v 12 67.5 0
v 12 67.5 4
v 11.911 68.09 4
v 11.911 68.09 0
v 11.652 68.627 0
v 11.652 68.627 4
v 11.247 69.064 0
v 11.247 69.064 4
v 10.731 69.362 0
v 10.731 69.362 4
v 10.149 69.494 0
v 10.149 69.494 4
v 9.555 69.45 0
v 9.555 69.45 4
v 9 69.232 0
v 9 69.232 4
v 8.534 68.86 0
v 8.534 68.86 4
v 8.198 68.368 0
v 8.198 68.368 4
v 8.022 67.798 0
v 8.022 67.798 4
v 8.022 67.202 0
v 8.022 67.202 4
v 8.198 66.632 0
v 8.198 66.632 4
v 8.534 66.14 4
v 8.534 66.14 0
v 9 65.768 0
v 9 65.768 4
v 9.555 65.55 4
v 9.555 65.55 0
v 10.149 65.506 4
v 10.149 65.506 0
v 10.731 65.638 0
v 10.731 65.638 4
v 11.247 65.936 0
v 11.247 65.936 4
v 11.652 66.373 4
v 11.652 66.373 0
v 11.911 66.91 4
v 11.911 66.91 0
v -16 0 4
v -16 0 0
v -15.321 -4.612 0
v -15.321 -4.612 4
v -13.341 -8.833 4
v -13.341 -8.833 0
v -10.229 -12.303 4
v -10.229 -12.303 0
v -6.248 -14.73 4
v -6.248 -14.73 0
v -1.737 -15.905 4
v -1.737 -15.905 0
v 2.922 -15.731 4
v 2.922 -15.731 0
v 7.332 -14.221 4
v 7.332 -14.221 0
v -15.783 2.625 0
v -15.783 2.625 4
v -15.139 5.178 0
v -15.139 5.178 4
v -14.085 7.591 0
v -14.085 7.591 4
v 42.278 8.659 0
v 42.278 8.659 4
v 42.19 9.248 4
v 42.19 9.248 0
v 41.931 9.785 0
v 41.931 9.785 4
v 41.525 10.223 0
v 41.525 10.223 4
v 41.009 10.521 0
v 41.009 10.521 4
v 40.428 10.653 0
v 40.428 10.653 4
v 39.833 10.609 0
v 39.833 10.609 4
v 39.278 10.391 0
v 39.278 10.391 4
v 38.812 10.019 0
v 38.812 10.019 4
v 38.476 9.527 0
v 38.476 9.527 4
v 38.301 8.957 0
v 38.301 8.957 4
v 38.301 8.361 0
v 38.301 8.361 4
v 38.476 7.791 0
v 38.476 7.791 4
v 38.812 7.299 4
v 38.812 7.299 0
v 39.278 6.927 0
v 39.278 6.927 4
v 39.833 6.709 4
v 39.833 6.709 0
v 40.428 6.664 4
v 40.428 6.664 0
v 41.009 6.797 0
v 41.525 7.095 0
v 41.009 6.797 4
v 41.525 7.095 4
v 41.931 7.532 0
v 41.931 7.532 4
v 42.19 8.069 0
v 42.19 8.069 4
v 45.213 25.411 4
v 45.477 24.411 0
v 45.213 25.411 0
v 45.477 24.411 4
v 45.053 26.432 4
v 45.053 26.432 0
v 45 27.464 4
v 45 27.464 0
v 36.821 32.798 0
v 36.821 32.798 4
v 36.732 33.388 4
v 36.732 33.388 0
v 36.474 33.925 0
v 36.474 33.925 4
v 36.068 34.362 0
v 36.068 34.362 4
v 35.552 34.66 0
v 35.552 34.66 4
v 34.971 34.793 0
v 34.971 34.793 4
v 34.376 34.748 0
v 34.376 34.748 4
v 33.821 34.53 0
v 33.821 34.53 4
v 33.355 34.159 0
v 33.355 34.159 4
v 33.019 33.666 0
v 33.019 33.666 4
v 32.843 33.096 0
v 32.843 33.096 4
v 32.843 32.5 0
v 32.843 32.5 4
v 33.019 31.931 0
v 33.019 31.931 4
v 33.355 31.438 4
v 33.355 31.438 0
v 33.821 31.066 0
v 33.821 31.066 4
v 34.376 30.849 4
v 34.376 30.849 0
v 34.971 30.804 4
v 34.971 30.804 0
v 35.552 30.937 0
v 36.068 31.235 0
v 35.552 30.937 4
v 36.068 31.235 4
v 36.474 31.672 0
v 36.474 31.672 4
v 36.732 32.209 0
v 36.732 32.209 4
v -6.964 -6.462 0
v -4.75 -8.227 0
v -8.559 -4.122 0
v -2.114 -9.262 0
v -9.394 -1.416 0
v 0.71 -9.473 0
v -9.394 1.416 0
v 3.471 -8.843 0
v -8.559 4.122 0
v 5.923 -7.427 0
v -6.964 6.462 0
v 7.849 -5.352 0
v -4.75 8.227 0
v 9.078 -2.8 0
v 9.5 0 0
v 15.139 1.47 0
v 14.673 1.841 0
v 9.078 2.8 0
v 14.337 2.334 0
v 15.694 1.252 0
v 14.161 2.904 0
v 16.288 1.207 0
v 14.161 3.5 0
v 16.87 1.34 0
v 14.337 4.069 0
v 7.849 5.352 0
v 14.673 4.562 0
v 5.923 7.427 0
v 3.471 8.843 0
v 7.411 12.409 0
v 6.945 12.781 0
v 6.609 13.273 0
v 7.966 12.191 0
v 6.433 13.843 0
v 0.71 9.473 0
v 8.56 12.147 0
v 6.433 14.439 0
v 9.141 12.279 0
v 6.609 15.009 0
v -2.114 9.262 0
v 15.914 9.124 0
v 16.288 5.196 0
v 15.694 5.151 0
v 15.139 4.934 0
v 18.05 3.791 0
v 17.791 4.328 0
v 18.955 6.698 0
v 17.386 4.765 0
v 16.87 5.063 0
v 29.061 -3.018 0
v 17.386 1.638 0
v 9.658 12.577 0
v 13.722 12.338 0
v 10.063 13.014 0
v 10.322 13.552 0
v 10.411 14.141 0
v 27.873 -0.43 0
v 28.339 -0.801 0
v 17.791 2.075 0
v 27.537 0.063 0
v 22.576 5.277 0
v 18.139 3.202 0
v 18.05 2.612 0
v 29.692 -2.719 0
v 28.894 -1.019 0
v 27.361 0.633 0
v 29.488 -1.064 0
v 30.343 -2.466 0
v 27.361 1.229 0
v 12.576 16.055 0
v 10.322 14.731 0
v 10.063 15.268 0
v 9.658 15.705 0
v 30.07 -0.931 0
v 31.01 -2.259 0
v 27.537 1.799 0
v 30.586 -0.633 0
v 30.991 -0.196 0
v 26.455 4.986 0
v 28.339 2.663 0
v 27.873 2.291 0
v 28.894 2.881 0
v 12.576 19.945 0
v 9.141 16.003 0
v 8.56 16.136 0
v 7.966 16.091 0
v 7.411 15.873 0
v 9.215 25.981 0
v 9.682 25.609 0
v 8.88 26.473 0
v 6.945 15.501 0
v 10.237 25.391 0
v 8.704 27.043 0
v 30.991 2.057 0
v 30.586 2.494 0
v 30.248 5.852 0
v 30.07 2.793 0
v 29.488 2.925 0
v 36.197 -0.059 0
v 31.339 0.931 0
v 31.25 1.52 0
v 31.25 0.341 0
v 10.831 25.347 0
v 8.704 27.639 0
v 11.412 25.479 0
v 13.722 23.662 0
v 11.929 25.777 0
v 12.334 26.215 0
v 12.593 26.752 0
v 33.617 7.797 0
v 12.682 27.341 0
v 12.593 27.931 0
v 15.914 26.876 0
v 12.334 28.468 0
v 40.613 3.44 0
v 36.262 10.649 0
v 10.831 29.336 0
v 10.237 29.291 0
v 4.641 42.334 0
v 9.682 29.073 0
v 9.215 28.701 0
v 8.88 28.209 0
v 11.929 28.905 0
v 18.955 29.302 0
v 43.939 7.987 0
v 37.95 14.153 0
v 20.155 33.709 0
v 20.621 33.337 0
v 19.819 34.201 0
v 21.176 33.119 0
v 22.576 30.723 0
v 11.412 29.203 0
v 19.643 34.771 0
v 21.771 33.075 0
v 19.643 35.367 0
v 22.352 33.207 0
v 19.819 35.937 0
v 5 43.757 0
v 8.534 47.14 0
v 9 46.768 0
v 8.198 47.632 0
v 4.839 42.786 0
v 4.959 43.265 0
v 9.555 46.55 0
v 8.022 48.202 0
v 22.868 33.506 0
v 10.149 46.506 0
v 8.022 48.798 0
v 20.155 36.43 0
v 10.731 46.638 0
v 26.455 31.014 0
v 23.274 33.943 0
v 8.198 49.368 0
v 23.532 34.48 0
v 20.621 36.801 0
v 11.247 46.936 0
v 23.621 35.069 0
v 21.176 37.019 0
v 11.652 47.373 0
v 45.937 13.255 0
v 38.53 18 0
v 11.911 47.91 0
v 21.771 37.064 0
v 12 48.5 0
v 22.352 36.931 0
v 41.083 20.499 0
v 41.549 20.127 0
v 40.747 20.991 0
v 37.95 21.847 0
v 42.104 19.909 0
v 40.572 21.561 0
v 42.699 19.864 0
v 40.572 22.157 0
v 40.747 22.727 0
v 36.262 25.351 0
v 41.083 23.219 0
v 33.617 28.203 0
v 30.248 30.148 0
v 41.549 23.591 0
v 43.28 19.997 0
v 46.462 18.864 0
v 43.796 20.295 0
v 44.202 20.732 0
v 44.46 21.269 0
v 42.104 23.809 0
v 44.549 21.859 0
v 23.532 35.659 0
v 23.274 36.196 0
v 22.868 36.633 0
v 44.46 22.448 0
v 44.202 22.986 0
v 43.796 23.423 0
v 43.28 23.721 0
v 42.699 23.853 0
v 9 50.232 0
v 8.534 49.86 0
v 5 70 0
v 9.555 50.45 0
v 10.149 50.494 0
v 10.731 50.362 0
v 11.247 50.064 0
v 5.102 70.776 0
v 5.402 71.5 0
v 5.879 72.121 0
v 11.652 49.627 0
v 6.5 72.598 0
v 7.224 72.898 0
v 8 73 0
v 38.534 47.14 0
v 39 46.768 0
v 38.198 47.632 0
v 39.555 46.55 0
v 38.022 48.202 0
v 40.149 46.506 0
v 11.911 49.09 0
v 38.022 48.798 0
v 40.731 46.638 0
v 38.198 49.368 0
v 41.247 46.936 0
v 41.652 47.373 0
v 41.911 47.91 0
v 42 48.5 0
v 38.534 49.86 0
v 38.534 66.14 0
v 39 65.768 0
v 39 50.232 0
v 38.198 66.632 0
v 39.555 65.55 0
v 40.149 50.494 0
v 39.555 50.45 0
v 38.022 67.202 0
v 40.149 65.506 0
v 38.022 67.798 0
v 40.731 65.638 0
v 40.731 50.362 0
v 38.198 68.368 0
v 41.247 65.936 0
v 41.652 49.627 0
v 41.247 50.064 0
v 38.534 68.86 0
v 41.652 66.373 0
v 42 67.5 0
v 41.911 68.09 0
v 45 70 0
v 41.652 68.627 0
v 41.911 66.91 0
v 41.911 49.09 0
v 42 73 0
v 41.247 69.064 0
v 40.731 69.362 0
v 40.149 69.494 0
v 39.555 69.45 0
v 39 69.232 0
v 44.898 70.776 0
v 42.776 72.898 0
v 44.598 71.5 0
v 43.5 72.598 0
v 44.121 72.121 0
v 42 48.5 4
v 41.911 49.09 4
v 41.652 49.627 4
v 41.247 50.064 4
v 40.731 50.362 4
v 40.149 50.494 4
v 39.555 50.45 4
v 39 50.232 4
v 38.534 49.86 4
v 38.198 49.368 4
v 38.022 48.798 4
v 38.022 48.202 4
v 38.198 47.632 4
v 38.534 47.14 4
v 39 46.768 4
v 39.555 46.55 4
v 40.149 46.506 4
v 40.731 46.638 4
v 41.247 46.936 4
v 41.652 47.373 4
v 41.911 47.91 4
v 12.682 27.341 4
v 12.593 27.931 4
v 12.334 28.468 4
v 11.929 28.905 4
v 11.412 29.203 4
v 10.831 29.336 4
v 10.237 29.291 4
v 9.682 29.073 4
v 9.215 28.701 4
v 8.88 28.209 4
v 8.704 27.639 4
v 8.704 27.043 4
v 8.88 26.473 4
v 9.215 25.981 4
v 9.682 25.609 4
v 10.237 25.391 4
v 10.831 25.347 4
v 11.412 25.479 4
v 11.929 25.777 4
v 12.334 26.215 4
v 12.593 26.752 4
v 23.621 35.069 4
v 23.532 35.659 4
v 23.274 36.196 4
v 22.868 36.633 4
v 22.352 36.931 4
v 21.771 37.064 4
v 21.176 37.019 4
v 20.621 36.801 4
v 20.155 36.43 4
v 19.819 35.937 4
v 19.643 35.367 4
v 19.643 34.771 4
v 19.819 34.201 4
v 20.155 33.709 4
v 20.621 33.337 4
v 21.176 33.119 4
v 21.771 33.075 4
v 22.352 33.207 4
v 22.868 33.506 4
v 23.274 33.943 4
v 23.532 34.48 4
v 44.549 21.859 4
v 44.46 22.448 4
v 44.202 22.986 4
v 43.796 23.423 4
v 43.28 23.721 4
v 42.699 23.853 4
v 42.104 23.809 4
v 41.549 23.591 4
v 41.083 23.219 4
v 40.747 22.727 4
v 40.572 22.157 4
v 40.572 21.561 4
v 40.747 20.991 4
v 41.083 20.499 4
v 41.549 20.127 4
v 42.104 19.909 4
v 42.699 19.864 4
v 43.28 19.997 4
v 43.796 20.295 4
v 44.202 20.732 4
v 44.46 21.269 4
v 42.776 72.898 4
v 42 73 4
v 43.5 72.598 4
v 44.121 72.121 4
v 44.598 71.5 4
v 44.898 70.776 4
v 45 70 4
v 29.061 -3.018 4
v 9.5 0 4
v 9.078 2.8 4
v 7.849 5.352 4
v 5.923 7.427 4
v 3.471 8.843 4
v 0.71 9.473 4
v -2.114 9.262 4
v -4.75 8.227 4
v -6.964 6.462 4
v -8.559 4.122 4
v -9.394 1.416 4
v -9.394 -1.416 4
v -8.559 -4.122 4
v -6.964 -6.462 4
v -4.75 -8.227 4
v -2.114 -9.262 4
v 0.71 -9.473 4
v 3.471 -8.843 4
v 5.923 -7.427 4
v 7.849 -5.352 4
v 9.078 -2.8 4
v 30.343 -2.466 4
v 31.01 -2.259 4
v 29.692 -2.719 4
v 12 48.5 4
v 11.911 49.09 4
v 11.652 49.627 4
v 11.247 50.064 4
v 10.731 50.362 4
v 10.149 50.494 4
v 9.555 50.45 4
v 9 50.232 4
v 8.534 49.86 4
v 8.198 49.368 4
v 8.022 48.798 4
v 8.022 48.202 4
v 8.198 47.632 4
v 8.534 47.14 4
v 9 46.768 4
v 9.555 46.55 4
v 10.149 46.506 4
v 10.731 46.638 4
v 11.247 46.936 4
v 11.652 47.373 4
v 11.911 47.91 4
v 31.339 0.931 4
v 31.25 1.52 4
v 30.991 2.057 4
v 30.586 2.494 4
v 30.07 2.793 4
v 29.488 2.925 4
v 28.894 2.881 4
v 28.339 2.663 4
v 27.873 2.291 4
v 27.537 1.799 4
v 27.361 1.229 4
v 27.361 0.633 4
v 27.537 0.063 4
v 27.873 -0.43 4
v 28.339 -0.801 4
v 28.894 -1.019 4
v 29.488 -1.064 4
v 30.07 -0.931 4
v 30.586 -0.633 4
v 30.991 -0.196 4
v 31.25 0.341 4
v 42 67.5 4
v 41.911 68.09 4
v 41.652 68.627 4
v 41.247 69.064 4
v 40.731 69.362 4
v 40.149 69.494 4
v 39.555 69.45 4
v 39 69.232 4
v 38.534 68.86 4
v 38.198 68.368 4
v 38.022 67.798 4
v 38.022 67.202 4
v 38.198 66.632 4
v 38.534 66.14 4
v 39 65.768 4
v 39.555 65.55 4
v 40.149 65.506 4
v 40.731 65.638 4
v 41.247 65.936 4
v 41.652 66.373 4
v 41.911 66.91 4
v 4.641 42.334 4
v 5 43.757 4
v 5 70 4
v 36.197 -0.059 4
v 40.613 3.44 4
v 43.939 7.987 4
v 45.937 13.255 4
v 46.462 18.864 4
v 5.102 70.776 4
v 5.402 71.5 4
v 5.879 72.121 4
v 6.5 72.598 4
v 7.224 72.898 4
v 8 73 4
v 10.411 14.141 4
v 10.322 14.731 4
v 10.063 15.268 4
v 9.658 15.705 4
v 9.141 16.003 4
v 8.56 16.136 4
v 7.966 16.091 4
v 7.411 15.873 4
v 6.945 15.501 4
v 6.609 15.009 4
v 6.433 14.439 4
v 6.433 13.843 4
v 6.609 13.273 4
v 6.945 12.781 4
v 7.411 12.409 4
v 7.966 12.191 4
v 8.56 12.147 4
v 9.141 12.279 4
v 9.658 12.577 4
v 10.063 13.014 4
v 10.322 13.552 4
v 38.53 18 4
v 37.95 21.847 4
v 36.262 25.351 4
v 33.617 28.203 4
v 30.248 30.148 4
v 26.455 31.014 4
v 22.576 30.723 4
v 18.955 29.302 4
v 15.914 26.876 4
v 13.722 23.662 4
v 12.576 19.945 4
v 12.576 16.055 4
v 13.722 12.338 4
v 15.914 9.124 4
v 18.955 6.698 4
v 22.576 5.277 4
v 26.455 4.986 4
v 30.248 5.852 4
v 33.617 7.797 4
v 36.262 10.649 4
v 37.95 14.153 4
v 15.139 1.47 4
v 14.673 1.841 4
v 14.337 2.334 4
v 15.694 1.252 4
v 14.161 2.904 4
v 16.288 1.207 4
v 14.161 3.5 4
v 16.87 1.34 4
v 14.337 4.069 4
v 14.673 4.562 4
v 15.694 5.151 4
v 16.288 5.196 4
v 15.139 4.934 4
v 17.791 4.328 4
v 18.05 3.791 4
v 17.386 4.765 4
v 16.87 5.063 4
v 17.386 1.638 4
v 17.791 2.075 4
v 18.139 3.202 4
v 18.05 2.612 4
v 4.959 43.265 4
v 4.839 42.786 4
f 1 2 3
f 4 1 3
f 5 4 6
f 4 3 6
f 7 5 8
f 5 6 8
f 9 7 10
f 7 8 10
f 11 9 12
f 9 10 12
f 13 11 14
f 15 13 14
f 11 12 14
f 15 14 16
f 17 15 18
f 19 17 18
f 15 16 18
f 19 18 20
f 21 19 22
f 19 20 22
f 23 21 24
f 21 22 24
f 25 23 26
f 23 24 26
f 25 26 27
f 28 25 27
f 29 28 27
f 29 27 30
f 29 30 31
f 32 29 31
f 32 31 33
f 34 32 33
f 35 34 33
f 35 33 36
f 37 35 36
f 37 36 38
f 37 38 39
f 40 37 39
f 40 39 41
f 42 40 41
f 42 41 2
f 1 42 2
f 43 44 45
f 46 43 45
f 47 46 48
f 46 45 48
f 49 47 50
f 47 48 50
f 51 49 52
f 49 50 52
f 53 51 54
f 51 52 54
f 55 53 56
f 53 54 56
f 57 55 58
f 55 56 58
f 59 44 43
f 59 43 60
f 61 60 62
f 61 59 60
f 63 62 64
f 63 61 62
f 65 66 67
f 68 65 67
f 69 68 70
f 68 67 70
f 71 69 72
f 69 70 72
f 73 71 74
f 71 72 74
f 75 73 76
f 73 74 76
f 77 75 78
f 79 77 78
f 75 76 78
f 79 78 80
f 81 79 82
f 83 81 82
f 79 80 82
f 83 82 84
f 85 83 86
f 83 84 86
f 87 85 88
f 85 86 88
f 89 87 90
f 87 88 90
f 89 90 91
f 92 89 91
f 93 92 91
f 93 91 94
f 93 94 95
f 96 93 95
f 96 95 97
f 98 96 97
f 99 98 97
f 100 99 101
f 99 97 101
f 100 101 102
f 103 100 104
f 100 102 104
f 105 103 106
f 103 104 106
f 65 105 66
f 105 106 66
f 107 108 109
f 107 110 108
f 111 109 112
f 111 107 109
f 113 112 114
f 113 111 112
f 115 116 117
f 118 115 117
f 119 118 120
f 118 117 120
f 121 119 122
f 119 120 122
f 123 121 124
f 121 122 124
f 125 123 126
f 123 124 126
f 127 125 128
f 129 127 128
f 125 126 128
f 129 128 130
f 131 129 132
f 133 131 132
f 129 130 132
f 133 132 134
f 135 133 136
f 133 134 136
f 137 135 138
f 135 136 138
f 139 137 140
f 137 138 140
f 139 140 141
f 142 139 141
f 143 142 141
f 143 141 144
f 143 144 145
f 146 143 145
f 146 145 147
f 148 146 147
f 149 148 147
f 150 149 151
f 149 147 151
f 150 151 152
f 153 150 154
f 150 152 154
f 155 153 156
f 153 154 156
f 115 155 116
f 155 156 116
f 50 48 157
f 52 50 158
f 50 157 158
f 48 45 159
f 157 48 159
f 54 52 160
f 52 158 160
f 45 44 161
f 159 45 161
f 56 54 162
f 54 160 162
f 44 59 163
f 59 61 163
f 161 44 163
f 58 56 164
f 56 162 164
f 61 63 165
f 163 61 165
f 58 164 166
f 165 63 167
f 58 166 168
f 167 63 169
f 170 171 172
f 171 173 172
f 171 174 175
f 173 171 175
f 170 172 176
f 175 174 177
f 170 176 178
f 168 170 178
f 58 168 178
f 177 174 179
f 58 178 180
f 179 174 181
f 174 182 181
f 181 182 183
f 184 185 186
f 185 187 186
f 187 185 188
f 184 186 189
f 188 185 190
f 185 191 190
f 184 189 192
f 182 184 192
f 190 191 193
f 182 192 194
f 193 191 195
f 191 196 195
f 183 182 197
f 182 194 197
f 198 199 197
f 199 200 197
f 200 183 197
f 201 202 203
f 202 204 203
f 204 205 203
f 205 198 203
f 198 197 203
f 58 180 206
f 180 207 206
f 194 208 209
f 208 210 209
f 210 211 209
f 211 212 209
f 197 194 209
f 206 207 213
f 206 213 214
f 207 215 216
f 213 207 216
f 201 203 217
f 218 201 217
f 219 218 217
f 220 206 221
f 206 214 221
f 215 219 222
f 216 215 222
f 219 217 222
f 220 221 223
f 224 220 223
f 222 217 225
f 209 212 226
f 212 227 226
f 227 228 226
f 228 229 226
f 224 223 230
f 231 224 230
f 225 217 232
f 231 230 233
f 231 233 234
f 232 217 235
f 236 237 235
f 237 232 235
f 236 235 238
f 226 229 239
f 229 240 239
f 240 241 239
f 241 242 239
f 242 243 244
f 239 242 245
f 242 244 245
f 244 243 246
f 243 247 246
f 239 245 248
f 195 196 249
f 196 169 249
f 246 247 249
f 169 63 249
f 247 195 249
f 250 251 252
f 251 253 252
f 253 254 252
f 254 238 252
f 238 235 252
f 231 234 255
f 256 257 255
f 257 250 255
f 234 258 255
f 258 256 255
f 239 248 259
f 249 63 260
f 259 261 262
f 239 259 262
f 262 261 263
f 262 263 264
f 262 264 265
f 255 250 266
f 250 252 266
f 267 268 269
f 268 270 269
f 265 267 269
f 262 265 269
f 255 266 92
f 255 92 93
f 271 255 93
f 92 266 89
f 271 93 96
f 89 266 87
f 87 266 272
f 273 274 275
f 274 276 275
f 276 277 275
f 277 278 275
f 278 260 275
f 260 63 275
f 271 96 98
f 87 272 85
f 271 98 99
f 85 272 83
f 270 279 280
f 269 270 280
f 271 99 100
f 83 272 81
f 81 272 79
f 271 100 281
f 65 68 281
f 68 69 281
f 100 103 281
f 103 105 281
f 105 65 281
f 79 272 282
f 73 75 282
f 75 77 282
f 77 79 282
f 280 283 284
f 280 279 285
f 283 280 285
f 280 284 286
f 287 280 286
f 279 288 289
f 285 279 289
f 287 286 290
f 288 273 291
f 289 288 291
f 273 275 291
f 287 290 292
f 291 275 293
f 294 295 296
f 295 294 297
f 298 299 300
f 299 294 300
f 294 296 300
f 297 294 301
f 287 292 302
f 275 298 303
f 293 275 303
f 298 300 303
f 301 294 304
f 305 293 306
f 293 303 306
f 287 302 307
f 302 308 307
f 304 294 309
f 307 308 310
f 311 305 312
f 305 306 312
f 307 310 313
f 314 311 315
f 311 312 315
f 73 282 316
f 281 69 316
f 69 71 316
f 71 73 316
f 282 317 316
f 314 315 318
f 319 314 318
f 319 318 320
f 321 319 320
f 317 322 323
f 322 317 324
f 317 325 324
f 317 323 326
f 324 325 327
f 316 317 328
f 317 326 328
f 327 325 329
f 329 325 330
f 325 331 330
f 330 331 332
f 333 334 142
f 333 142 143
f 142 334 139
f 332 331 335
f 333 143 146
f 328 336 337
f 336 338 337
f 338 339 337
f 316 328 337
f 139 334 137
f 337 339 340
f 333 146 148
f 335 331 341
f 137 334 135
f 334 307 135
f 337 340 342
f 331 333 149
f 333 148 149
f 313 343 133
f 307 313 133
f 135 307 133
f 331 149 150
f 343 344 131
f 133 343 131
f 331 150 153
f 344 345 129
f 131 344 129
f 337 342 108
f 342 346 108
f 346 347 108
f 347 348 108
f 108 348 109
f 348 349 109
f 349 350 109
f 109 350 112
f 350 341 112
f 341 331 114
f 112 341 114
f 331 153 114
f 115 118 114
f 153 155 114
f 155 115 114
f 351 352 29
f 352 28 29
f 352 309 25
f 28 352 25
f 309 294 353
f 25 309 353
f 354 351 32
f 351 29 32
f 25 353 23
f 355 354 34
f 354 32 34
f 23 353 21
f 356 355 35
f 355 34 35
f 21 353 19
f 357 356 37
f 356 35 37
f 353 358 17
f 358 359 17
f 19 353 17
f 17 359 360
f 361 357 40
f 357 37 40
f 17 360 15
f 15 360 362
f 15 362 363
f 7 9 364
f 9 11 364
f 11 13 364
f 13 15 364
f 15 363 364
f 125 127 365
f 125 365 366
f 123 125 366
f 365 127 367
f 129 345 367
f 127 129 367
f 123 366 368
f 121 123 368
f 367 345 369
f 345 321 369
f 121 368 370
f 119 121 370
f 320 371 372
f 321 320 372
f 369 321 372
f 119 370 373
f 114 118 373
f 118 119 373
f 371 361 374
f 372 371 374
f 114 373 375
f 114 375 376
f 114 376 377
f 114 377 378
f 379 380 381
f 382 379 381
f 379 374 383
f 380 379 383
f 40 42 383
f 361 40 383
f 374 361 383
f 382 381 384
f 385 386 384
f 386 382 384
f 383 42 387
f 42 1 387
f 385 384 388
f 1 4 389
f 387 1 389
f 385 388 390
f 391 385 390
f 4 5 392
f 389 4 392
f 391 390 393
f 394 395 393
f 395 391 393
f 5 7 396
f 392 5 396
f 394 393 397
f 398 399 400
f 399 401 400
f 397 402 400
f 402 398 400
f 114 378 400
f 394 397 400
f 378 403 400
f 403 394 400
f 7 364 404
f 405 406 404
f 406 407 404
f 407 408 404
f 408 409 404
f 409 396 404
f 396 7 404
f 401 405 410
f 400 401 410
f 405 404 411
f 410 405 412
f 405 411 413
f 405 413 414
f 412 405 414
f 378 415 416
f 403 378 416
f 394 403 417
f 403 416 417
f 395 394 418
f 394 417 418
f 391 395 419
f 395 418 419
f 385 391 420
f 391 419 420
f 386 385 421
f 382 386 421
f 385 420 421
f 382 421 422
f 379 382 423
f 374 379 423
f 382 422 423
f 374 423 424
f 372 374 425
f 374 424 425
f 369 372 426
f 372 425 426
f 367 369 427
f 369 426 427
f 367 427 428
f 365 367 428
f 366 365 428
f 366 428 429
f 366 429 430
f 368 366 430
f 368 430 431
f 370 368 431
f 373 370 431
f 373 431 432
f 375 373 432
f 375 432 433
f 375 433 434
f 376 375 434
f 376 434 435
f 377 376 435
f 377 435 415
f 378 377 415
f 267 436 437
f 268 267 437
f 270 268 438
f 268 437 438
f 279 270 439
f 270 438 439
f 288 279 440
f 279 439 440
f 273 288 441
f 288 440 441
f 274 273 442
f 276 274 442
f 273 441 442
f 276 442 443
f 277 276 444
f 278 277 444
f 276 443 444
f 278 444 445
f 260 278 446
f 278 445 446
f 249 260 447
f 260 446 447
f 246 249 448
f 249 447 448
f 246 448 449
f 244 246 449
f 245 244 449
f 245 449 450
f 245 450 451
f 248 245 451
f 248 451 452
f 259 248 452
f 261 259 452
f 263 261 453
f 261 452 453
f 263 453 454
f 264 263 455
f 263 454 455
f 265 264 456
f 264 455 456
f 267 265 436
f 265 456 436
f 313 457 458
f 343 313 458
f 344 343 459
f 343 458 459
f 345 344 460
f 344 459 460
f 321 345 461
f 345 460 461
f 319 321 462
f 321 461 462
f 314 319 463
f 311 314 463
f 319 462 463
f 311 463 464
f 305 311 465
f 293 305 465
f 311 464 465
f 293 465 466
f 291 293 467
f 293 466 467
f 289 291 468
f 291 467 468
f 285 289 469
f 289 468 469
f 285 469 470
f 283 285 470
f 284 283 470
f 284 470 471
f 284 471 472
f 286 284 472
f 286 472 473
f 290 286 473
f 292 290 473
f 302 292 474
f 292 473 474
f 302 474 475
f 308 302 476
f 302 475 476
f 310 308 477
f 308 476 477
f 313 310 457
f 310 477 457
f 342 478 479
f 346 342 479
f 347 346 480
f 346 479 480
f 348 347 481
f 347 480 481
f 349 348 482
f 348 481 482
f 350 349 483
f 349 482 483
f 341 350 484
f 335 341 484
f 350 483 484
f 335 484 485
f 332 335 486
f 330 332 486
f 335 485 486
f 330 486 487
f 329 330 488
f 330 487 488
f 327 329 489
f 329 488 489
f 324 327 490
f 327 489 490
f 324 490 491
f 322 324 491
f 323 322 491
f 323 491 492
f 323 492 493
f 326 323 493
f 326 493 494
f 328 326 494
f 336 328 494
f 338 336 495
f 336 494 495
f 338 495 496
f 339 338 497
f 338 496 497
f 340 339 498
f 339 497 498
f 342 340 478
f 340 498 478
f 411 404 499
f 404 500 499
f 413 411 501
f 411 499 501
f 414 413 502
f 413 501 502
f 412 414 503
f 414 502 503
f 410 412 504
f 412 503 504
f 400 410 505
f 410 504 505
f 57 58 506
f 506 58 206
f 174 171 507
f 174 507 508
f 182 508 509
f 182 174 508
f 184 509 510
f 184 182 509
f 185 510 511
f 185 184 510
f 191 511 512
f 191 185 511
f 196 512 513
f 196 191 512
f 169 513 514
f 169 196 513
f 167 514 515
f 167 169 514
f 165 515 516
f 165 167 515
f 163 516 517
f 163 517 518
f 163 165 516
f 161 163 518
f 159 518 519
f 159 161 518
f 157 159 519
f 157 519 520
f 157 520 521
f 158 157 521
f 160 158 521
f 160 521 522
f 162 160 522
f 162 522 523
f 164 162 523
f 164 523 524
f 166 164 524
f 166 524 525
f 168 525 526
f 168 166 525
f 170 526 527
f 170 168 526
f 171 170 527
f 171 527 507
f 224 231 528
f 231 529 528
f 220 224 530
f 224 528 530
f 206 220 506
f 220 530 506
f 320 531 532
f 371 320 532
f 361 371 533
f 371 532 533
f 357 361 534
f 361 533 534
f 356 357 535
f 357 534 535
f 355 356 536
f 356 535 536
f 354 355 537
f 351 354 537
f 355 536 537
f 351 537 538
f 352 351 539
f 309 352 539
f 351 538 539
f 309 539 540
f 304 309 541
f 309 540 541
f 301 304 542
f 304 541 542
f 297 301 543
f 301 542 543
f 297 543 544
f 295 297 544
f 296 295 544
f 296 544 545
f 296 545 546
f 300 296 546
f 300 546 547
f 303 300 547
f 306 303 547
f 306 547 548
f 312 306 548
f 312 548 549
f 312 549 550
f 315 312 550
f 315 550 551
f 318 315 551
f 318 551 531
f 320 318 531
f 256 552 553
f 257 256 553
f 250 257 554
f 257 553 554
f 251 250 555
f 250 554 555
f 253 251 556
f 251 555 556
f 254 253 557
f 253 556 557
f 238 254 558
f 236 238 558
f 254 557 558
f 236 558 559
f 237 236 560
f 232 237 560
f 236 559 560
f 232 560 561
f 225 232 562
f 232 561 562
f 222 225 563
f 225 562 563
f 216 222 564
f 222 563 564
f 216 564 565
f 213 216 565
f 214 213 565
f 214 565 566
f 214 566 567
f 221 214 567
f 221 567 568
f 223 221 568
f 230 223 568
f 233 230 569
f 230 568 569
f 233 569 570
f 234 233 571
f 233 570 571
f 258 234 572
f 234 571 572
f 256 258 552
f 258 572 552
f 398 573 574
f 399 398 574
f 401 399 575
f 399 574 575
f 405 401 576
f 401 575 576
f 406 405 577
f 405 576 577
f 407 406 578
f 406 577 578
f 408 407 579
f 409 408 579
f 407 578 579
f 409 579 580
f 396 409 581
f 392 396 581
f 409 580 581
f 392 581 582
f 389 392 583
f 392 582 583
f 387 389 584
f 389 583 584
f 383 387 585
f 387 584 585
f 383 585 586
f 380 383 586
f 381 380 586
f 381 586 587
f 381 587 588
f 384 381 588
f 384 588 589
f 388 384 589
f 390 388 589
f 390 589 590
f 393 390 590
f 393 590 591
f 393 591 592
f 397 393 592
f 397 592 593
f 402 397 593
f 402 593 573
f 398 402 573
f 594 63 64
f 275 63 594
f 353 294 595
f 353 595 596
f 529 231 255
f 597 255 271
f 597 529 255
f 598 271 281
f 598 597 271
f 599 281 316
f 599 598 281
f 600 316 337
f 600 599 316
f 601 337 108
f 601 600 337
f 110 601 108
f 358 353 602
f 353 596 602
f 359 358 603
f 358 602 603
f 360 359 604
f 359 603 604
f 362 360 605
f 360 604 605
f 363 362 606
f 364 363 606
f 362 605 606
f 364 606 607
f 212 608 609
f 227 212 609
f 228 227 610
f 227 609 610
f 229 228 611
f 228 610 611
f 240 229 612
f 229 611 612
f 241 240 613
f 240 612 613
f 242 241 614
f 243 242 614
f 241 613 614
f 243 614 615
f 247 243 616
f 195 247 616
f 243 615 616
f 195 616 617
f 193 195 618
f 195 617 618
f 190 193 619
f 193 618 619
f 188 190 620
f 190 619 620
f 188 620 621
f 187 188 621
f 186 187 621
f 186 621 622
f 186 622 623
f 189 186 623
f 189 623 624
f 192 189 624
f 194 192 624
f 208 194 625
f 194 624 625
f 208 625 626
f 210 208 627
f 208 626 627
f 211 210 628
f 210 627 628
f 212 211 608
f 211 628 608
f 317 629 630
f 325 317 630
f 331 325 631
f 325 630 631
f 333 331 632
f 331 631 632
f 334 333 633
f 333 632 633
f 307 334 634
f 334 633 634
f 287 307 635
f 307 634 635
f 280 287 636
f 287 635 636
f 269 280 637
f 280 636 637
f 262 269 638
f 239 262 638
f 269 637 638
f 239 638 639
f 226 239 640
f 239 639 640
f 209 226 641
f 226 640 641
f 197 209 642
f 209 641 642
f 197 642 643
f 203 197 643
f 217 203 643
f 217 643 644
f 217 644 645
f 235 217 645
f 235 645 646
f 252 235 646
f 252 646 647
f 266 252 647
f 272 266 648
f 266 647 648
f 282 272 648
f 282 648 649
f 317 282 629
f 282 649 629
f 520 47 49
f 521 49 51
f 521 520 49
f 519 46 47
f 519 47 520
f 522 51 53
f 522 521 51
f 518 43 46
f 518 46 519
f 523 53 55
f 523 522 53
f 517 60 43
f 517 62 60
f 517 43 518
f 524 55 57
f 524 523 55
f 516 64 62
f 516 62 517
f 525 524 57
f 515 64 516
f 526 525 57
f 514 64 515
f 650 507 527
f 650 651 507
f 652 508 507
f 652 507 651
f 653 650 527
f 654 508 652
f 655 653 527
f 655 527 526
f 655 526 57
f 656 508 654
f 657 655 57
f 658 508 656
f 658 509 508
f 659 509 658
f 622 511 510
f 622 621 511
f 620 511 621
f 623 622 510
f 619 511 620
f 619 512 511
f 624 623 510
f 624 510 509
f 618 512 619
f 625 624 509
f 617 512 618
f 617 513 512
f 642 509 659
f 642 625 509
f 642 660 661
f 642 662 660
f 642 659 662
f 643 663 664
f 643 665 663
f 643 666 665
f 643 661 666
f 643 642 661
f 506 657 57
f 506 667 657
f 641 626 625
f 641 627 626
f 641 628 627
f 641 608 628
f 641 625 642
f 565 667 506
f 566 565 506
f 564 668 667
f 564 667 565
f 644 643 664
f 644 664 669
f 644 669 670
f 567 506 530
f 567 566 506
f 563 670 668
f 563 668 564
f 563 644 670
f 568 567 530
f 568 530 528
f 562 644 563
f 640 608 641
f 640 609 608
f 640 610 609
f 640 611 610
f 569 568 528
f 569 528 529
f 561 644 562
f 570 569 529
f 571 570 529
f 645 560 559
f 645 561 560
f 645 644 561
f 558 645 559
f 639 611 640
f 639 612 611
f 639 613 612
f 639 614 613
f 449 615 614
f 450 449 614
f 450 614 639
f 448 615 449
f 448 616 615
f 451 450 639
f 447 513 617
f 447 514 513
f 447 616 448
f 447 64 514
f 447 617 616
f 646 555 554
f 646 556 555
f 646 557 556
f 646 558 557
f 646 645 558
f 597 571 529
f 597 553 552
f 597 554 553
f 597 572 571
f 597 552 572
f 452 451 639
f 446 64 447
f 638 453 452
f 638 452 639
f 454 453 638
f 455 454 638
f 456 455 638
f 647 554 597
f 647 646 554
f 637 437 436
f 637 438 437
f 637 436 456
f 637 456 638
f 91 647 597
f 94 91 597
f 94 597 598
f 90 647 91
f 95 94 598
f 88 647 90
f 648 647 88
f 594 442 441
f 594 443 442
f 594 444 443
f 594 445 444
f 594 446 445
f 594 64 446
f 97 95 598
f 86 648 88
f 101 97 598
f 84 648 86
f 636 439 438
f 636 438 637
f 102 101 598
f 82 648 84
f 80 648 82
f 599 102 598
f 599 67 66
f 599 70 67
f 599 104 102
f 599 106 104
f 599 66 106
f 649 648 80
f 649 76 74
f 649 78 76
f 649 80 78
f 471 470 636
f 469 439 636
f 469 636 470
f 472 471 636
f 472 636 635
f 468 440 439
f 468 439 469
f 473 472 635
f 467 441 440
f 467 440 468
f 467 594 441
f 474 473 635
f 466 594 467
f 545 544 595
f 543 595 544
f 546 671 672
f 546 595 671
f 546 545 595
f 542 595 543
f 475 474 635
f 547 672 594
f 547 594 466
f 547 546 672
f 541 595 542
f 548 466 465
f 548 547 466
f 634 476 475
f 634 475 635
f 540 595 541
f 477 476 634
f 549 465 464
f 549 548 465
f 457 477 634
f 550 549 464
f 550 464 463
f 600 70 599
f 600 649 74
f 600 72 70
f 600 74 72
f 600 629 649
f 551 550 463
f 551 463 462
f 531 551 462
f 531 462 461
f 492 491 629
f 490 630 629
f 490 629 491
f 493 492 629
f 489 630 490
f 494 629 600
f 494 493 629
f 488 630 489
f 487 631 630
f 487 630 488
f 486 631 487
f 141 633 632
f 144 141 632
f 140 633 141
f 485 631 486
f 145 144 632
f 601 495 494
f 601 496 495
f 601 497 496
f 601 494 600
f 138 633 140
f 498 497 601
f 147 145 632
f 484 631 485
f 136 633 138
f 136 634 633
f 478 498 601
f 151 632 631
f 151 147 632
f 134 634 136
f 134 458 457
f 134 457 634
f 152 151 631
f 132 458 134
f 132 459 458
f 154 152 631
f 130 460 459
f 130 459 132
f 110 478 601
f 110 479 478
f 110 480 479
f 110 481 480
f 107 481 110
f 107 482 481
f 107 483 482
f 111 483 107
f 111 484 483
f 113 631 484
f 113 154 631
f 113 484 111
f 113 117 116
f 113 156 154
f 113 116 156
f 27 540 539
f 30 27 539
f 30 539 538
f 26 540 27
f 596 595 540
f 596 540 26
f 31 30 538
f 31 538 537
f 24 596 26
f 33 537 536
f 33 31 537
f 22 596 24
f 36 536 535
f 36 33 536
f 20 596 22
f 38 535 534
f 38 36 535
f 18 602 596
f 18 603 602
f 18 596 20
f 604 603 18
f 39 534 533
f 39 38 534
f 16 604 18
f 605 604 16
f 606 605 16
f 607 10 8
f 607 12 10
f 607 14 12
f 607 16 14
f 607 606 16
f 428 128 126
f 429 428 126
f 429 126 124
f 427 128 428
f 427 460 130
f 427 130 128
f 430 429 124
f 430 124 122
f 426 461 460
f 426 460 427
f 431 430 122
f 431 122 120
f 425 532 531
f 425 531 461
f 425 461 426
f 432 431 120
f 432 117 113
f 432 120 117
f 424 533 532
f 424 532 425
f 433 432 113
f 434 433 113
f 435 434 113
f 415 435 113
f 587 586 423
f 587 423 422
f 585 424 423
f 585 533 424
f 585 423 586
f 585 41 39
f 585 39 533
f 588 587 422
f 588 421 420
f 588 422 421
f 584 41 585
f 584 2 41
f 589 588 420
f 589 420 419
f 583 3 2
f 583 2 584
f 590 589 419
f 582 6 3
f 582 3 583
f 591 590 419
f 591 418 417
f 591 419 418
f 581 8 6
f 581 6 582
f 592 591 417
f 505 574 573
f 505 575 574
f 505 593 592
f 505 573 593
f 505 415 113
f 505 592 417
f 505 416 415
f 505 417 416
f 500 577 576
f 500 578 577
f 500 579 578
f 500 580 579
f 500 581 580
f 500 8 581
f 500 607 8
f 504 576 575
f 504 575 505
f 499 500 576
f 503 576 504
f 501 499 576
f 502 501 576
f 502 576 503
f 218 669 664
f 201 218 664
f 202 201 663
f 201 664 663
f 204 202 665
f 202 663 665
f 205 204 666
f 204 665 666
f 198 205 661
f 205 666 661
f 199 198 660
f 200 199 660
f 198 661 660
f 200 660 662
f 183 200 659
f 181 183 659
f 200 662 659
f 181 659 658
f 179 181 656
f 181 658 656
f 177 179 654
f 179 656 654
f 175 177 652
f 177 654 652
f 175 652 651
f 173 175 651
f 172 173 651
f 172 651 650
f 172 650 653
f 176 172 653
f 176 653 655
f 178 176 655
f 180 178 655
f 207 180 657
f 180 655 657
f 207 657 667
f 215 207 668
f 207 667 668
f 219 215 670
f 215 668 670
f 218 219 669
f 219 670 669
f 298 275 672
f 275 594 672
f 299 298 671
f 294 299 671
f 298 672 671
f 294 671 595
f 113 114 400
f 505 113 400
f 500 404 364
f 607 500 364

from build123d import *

# Parameters (mm, degrees)
SKETCH_1_R          = 13.05
SKETCH_1_R_2        = 9.5
EXTRUDE_1_DEPTH     = 4
FILLET_1_R          = 3
CUT_EXTRUDE_START   = -10
CUT_EXTRUDE_1_DEPTH = 10
SKETCH_3_R          = 2
CUT_EXTRUDE_2_DEPTH = 10
FILLET_2_R          = 3
SKETCH_4_R          = 2
CUT_EXTRUDE_3_DEPTH = 28
SKETCH_6_R          = 20.45
EXTRUDE_2_DEPTH     = 4
SKETCH_7_R          = 21
EXTRUDE_3_DEPTH     = 4
SKETCH_8_R          = 13.05
CUT_EXTRUDE_4_DEPTH = 4
SKETCH_9_R          = 2
CUT_EXTRUDE_5_DEPTH = 4
FILLET_3_R          = 10


with BuildPart() as part:
    # 草图1 → 凸台-拉伸1 (new body)
    with BuildSketch(Plane.XY):
        with BuildLine():
            Line((-16, 73), (-16, 0))
            ThreePointArc((-16, 0), (-8.327115073, -13.662326103), (7.33239432, -14.220970204))
            Line((7.33239432, -14.220970204), (33.623767545, -0.665023393))
            ThreePointArc((33.623767545, -0.665023393), (41.931803011, 7.070661466), (45, 18))
            Line((45, 18), (45, 73))
            Line((45, 73), (-16, 73))
        make_face()
        with Locations((24, 18)):
            Circle(SKETCH_1_R, mode=Mode.SUBTRACT)
        Circle(SKETCH_1_R_2, mode=Mode.SUBTRACT)
    extrude(amount=EXTRUDE_1_DEPTH)

    # 圆角1
    fillet_1_edges = [part.edges().sort_by_distance(p)[0] for p in [
        (45, 73, 2),
        (-16, 73, 2),
    ]]
    fillet(fillet_1_edges, radius=FILLET_1_R)

    # 草图2 → 切除-拉伸1 (cut)
    with BuildSketch(Plane.XY.offset(4).offset(CUT_EXTRUDE_START)):
        with BuildLine():
            Line((-14.084507501, 7.591221802), (5, 43))
            Line((5, 43), (5, 73))
            Line((5, 73), (-16, 73))
            Line((-16, 73), (-16, 0))
            ThreePointArc((-16, 0), (-15.513737783, 3.914580436), (-14.084507501, 7.591221802))
        make_face()
    extrude(amount=CUT_EXTRUDE_1_DEPTH, mode=Mode.SUBTRACT)

    # 草图3 → 切除-拉伸2 (cut)
    with BuildSketch(Plane.XY.offset(4)):
        with Locations((8.941696856, 26.916137415)):
            Circle(SKETCH_3_R)
        with Locations((19.656832962, 34.952489495)):
            Circle(SKETCH_3_R)
        with Locations((32.916137415, 33.058303144)):
            Circle(SKETCH_3_R)
        with Locations((40.952489495, 22.343167038)):
            Circle(SKETCH_3_R)
        with Locations((39.058303144, 9.083862585)):
            Circle(SKETCH_3_R)
        with Locations((28.343167038, 1.047510505)):
            Circle(SKETCH_3_R)
        with Locations((15.083862585, 2.941696856)):
            Circle(SKETCH_3_R)
        with Locations((7.047510505, 13.656832962)):
            Circle(SKETCH_3_R)
    extrude(amount=-CUT_EXTRUDE_2_DEPTH, mode=Mode.SUBTRACT)

    # 圆角2
    fillet_2_edges = [part.edges().sort_by_distance(p)[0] for p in [
        (5, 43, 2),
        (5, 73, 2),
    ]]
    fillet(fillet_2_edges, radius=FILLET_2_R)

    # 草图4 → 切除-拉伸3 (cut)
    with BuildSketch(Plane.XY.offset(4)):
        with Locations((40, 67.5)):
            Circle(SKETCH_4_R)
        with Locations((10, 67.5)):
            Circle(SKETCH_4_R)
        with Locations((10, 48.5)):
            Circle(SKETCH_4_R)
        with Locations((40, 48.5)):
            Circle(SKETCH_4_R)
    extrude(amount=-CUT_EXTRUDE_3_DEPTH, mode=Mode.SUBTRACT)

    # 草图6 → 凸台-拉伸2 (add)
    with BuildSketch(Plane.XY.offset(4)):
        with Locations((24, 18)):
            Circle(SKETCH_6_R)
    extrude(amount=-EXTRUDE_2_DEPTH)

    # 草图7 → 凸台-拉伸3 (add)
    with BuildSketch(Plane.XY.offset(4)):
        with Locations((25.48, 18)):
            Circle(SKETCH_7_R)
    extrude(amount=-EXTRUDE_3_DEPTH)

    # 草图8 → 切除-拉伸4 (cut)
    with BuildSketch(Plane.XY.offset(4)):
        with Locations((25.48, 18)):
            Circle(SKETCH_8_R)
    extrude(amount=-CUT_EXTRUDE_4_DEPTH, mode=Mode.SUBTRACT)

    # 草图9 → 切除-拉伸5 (cut)
    with BuildSketch(Plane.XY.offset(4)):
        with Locations((10.681592776, 27.341153229)):
            Circle(SKETCH_9_R)
        with Locations((21.621138693, 35.069246891)):
            Circle(SKETCH_9_R)
        with Locations((34.821153229, 32.798407224)):
            Circle(SKETCH_9_R)
        with Locations((42.549246891, 21.858861307)):
            Circle(SKETCH_9_R)
        with Locations((40.278407224, 8.658846771)):
            Circle(SKETCH_9_R)
        with Locations((29.338861307, 0.930753109)):
            Circle(SKETCH_9_R)
        with Locations((16.138846771, 3.201592776)):
            Circle(SKETCH_9_R)
        with Locations((8.410753109, 14.141138693)):
            Circle(SKETCH_9_R)
    extrude(amount=-CUT_EXTRUDE_5_DEPTH, mode=Mode.SUBTRACT)

    # 圆角3
    fillet_3_edges = [part.edges().sort_by_distance(p)[0] for p in [
        (45, 25.744004132, 2),
        (30.087589458, -2.488292252, 2),
    ]]
    fillet(fillet_3_edges, radius=FILLET_3_R)


solid = part.part
